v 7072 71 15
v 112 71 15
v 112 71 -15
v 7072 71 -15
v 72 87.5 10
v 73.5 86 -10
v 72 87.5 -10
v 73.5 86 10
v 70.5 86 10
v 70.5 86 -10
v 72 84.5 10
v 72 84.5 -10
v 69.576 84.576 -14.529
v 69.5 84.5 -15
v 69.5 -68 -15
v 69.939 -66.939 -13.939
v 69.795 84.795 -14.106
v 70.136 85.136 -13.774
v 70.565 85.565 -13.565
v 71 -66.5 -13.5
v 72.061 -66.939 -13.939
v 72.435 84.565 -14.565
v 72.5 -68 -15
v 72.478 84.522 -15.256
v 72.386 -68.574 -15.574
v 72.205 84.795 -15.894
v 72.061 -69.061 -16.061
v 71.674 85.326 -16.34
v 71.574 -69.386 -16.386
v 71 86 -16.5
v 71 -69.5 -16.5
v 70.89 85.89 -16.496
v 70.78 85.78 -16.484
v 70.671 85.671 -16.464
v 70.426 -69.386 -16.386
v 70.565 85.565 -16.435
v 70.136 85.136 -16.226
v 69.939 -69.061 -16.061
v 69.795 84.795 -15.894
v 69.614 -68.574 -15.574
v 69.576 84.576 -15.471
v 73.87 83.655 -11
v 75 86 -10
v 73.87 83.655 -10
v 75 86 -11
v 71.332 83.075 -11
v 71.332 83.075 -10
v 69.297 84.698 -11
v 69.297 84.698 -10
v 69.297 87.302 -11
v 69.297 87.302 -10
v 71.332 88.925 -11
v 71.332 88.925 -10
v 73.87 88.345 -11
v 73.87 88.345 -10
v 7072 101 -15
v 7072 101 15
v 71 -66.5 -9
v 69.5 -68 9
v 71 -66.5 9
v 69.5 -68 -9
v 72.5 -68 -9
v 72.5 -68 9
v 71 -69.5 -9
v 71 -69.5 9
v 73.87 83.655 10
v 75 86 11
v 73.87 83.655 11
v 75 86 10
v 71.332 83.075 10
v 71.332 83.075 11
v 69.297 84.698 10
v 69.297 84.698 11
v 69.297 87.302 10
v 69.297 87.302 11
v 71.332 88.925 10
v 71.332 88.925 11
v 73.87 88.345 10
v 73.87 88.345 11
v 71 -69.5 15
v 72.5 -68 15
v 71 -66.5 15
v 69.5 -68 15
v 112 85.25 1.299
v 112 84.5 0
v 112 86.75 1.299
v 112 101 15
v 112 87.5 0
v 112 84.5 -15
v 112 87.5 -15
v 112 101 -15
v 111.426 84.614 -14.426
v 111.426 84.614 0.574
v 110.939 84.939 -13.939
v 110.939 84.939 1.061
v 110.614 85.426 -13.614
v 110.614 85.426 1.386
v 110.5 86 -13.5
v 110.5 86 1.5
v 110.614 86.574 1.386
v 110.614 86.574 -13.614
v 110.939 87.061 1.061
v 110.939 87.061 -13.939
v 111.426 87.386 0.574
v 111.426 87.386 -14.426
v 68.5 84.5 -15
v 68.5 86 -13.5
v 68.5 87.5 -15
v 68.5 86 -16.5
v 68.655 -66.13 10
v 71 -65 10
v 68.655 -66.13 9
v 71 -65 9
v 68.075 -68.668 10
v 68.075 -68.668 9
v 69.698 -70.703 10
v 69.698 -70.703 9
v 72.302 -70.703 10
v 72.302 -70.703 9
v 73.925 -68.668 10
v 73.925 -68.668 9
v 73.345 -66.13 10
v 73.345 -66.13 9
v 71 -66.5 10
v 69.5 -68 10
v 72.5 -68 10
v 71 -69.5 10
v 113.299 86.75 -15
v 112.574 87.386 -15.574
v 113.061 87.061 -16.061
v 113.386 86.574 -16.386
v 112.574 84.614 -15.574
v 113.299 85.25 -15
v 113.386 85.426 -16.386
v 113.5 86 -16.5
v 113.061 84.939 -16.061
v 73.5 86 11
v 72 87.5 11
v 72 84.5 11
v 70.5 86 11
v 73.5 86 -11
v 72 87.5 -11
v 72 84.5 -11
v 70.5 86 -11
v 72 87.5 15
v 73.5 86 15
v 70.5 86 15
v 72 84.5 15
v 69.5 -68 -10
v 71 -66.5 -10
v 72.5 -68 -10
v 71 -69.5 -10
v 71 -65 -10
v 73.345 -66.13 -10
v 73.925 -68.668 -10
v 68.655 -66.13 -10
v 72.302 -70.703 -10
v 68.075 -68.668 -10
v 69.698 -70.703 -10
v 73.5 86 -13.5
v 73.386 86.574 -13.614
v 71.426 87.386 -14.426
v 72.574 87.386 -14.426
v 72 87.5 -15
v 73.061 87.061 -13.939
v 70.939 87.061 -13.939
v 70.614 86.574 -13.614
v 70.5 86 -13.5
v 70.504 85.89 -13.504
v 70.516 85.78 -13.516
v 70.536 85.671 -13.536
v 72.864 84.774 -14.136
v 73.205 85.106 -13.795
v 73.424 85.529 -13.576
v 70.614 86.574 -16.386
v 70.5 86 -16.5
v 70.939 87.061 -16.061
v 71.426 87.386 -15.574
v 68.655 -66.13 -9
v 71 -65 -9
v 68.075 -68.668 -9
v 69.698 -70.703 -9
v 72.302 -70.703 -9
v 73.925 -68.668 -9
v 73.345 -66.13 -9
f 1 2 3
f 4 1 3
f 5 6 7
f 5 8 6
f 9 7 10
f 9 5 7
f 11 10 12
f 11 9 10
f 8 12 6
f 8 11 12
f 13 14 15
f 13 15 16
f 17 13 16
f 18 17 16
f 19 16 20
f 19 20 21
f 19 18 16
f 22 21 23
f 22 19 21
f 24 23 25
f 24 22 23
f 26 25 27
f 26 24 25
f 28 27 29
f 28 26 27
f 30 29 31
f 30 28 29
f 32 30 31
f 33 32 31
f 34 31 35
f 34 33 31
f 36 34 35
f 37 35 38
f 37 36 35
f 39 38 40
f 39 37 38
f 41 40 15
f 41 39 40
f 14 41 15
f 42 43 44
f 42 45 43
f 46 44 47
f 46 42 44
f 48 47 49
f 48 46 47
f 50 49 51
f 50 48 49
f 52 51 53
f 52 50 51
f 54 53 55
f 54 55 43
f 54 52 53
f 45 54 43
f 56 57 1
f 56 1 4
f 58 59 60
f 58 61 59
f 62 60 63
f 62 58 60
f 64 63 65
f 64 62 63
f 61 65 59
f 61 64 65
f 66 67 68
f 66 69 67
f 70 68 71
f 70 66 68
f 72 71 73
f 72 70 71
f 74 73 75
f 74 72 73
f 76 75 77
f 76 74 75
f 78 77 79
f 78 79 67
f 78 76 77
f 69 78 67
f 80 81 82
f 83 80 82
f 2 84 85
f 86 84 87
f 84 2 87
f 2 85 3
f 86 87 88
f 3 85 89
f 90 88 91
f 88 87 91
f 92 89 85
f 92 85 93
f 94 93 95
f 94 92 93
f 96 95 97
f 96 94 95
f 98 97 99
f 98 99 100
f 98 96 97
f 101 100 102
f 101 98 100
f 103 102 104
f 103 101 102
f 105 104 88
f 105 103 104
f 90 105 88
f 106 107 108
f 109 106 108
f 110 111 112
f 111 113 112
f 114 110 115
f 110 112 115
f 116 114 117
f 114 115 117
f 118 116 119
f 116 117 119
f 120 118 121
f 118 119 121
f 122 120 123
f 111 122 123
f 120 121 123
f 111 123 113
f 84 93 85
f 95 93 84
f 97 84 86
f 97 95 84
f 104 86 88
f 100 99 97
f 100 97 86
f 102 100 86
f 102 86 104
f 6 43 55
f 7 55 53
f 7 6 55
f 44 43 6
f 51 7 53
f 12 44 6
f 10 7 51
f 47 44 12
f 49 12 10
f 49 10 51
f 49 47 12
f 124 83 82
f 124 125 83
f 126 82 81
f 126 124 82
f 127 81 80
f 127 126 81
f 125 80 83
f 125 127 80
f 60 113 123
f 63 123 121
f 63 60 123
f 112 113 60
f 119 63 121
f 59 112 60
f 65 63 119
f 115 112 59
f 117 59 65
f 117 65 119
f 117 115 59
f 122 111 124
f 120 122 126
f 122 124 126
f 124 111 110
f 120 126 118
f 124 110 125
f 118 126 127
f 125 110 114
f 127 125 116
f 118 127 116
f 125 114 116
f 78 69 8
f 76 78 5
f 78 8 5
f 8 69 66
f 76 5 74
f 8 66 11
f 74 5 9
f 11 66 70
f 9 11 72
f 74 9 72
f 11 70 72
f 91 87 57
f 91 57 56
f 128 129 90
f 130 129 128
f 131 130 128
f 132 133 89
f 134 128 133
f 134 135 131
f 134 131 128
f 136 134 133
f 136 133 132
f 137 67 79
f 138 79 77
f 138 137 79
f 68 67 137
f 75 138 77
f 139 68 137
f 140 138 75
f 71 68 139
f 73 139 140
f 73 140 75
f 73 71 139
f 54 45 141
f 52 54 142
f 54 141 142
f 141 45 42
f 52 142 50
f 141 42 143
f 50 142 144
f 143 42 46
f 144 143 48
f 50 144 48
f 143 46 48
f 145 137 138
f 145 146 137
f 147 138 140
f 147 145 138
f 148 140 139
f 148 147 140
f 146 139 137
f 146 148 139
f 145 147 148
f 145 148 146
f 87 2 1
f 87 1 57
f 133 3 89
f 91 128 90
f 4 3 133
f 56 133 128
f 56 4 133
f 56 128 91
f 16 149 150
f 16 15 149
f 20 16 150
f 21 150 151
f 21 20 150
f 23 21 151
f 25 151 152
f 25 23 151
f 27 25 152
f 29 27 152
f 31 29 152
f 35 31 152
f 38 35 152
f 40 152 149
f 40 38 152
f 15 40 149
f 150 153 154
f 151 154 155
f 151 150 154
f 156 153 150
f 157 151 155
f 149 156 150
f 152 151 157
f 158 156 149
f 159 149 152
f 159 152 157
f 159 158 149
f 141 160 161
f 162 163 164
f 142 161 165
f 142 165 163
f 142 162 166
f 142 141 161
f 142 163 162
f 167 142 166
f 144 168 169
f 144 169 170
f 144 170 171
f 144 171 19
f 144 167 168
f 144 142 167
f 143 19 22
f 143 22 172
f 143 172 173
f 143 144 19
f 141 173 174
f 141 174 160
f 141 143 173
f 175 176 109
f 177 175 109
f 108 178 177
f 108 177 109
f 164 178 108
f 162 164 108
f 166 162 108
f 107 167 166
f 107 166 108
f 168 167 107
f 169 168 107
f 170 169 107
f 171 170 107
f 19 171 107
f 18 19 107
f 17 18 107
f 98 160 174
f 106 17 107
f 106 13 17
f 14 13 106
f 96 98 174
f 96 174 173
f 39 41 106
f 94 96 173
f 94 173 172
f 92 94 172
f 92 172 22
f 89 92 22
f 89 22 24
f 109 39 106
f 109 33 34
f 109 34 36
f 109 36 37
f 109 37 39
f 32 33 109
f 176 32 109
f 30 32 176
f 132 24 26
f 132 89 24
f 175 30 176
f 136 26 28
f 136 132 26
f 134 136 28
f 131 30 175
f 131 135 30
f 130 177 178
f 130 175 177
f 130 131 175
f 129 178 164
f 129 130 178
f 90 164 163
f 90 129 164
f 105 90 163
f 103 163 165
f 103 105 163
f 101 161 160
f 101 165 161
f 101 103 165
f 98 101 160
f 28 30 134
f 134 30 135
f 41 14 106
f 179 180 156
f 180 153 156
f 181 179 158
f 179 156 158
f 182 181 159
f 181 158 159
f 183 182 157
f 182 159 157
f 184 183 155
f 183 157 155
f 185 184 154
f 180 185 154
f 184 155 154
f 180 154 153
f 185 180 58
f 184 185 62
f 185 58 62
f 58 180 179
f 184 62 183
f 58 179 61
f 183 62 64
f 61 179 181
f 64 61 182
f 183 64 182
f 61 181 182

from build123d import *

# Parameters (mm, degrees)
ESQUISSE8_R        = 1.5
ESQUISSE9_W        = 3
ESQUISSE9_H        = 1
ESQUISSE11_R       = 1.5
ESQUISSE12_W       = 1
ESQUISSE12_H       = 3
ESQUISSE14_R       = 1.5
BOSS_EXTRU_4_DEPTH = 2.5
ESQUISSE15_W       = 30
ESQUISSE15_H       = 30
BOSS_EXTRU_5_DEPTH = 6960


with BuildPart() as part:
    # Balayage1: sweep along a path in Esquisse7
    with BuildLine(Plane(origin=(71, 86, 0), x_dir=(-1, 0, 0), z_dir=(0, -1, 0))) as balayage1_path:
        Line((-7001, 0), (-41, 0))
        Line((-41, 0), (-41, 15))
        Line((-41, 15), (-1, 15))
        Line((-1, 15), (-1, -15))
    # Esquisse8 → Balayage1 (sweep)
    with BuildSketch(Plane(origin=(72, 86, 15), x_dir=(1, 0, 0), z_dir=(0, 0, 1))):
        Circle(ESQUISSE8_R)
    sweep(path=balayage1_path.line, transition=Transition.RIGHT)

    # Esquisse9 → Révolution1 (revolve)
    with BuildSketch(Plane(origin=(71, 86, 0), x_dir=(-1, 0, 0), z_dir=(0, -1, 0)), mode=Mode.PRIVATE) as r_volution1_sk:
        with Locations((0.5, -10.5)):
            Rectangle(ESQUISSE9_W, ESQUISSE9_H)
        with Locations((0.5, 10.5)):
            Rectangle(ESQUISSE9_W, ESQUISSE9_H)
    revolve(r_volution1_sk.sketch.rotate(Axis((72, 86, 10), (0, 0, -1)), 180), axis=Axis((72, 86, 10), (0, 0, -1)))

    # Balayage2: sweep along a path in Esquisse10
    with BuildLine(Plane(origin=(71, 0, 0), x_dir=(0, 0, -1), z_dir=(1, 0, 0))) as balayage2_path:
        Line((-15, -68), (15, -68))
        Line((15, -68), (15, 86))
    # Esquisse11 → Balayage2 (sweep)
    with BuildSketch(Plane(origin=(71, -68, 15), x_dir=(-1, 0, 0), z_dir=(0, 0, -1))):
        Circle(ESQUISSE11_R)
    sweep(path=balayage2_path.line, transition=Transition.RIGHT)

    # Esquisse12 → Révolution2 (revolve)
    with BuildSketch(Plane(origin=(71, 0, 0), x_dir=(0, 0, -1), z_dir=(1, 0, 0))):
        with Locations((9.5, -66.5)):
            Rectangle(ESQUISSE12_W, ESQUISSE12_H)
        with Locations((-9.5, -66.5)):
            Rectangle(ESQUISSE12_W, ESQUISSE12_H)
    revolve(axis=Axis((71, -68, -10), (0, 0, 1)))

    # Esquisse14 → Boss.-Extru.4 (add, symmetric)
    with BuildSketch(Plane(origin=(71, 0, 0), x_dir=(0, 0, -1), z_dir=(1, 0, 0))):
        with Locations((15, 86)):
            Circle(ESQUISSE14_R)
    extrude(amount=BOSS_EXTRU_4_DEPTH, both=True)

    # Esquisse15 → Boss.-Extru.5 (add)
    with BuildSketch(Plane(origin=(7072, 0, 0), x_dir=(0, 0, -1), z_dir=(1, 0, 0))):
        with Locations((0, 86)):
            Rectangle(ESQUISSE15_W, ESQUISSE15_H)
    extrude(amount=-BOSS_EXTRU_5_DEPTH)


solid = part.part
